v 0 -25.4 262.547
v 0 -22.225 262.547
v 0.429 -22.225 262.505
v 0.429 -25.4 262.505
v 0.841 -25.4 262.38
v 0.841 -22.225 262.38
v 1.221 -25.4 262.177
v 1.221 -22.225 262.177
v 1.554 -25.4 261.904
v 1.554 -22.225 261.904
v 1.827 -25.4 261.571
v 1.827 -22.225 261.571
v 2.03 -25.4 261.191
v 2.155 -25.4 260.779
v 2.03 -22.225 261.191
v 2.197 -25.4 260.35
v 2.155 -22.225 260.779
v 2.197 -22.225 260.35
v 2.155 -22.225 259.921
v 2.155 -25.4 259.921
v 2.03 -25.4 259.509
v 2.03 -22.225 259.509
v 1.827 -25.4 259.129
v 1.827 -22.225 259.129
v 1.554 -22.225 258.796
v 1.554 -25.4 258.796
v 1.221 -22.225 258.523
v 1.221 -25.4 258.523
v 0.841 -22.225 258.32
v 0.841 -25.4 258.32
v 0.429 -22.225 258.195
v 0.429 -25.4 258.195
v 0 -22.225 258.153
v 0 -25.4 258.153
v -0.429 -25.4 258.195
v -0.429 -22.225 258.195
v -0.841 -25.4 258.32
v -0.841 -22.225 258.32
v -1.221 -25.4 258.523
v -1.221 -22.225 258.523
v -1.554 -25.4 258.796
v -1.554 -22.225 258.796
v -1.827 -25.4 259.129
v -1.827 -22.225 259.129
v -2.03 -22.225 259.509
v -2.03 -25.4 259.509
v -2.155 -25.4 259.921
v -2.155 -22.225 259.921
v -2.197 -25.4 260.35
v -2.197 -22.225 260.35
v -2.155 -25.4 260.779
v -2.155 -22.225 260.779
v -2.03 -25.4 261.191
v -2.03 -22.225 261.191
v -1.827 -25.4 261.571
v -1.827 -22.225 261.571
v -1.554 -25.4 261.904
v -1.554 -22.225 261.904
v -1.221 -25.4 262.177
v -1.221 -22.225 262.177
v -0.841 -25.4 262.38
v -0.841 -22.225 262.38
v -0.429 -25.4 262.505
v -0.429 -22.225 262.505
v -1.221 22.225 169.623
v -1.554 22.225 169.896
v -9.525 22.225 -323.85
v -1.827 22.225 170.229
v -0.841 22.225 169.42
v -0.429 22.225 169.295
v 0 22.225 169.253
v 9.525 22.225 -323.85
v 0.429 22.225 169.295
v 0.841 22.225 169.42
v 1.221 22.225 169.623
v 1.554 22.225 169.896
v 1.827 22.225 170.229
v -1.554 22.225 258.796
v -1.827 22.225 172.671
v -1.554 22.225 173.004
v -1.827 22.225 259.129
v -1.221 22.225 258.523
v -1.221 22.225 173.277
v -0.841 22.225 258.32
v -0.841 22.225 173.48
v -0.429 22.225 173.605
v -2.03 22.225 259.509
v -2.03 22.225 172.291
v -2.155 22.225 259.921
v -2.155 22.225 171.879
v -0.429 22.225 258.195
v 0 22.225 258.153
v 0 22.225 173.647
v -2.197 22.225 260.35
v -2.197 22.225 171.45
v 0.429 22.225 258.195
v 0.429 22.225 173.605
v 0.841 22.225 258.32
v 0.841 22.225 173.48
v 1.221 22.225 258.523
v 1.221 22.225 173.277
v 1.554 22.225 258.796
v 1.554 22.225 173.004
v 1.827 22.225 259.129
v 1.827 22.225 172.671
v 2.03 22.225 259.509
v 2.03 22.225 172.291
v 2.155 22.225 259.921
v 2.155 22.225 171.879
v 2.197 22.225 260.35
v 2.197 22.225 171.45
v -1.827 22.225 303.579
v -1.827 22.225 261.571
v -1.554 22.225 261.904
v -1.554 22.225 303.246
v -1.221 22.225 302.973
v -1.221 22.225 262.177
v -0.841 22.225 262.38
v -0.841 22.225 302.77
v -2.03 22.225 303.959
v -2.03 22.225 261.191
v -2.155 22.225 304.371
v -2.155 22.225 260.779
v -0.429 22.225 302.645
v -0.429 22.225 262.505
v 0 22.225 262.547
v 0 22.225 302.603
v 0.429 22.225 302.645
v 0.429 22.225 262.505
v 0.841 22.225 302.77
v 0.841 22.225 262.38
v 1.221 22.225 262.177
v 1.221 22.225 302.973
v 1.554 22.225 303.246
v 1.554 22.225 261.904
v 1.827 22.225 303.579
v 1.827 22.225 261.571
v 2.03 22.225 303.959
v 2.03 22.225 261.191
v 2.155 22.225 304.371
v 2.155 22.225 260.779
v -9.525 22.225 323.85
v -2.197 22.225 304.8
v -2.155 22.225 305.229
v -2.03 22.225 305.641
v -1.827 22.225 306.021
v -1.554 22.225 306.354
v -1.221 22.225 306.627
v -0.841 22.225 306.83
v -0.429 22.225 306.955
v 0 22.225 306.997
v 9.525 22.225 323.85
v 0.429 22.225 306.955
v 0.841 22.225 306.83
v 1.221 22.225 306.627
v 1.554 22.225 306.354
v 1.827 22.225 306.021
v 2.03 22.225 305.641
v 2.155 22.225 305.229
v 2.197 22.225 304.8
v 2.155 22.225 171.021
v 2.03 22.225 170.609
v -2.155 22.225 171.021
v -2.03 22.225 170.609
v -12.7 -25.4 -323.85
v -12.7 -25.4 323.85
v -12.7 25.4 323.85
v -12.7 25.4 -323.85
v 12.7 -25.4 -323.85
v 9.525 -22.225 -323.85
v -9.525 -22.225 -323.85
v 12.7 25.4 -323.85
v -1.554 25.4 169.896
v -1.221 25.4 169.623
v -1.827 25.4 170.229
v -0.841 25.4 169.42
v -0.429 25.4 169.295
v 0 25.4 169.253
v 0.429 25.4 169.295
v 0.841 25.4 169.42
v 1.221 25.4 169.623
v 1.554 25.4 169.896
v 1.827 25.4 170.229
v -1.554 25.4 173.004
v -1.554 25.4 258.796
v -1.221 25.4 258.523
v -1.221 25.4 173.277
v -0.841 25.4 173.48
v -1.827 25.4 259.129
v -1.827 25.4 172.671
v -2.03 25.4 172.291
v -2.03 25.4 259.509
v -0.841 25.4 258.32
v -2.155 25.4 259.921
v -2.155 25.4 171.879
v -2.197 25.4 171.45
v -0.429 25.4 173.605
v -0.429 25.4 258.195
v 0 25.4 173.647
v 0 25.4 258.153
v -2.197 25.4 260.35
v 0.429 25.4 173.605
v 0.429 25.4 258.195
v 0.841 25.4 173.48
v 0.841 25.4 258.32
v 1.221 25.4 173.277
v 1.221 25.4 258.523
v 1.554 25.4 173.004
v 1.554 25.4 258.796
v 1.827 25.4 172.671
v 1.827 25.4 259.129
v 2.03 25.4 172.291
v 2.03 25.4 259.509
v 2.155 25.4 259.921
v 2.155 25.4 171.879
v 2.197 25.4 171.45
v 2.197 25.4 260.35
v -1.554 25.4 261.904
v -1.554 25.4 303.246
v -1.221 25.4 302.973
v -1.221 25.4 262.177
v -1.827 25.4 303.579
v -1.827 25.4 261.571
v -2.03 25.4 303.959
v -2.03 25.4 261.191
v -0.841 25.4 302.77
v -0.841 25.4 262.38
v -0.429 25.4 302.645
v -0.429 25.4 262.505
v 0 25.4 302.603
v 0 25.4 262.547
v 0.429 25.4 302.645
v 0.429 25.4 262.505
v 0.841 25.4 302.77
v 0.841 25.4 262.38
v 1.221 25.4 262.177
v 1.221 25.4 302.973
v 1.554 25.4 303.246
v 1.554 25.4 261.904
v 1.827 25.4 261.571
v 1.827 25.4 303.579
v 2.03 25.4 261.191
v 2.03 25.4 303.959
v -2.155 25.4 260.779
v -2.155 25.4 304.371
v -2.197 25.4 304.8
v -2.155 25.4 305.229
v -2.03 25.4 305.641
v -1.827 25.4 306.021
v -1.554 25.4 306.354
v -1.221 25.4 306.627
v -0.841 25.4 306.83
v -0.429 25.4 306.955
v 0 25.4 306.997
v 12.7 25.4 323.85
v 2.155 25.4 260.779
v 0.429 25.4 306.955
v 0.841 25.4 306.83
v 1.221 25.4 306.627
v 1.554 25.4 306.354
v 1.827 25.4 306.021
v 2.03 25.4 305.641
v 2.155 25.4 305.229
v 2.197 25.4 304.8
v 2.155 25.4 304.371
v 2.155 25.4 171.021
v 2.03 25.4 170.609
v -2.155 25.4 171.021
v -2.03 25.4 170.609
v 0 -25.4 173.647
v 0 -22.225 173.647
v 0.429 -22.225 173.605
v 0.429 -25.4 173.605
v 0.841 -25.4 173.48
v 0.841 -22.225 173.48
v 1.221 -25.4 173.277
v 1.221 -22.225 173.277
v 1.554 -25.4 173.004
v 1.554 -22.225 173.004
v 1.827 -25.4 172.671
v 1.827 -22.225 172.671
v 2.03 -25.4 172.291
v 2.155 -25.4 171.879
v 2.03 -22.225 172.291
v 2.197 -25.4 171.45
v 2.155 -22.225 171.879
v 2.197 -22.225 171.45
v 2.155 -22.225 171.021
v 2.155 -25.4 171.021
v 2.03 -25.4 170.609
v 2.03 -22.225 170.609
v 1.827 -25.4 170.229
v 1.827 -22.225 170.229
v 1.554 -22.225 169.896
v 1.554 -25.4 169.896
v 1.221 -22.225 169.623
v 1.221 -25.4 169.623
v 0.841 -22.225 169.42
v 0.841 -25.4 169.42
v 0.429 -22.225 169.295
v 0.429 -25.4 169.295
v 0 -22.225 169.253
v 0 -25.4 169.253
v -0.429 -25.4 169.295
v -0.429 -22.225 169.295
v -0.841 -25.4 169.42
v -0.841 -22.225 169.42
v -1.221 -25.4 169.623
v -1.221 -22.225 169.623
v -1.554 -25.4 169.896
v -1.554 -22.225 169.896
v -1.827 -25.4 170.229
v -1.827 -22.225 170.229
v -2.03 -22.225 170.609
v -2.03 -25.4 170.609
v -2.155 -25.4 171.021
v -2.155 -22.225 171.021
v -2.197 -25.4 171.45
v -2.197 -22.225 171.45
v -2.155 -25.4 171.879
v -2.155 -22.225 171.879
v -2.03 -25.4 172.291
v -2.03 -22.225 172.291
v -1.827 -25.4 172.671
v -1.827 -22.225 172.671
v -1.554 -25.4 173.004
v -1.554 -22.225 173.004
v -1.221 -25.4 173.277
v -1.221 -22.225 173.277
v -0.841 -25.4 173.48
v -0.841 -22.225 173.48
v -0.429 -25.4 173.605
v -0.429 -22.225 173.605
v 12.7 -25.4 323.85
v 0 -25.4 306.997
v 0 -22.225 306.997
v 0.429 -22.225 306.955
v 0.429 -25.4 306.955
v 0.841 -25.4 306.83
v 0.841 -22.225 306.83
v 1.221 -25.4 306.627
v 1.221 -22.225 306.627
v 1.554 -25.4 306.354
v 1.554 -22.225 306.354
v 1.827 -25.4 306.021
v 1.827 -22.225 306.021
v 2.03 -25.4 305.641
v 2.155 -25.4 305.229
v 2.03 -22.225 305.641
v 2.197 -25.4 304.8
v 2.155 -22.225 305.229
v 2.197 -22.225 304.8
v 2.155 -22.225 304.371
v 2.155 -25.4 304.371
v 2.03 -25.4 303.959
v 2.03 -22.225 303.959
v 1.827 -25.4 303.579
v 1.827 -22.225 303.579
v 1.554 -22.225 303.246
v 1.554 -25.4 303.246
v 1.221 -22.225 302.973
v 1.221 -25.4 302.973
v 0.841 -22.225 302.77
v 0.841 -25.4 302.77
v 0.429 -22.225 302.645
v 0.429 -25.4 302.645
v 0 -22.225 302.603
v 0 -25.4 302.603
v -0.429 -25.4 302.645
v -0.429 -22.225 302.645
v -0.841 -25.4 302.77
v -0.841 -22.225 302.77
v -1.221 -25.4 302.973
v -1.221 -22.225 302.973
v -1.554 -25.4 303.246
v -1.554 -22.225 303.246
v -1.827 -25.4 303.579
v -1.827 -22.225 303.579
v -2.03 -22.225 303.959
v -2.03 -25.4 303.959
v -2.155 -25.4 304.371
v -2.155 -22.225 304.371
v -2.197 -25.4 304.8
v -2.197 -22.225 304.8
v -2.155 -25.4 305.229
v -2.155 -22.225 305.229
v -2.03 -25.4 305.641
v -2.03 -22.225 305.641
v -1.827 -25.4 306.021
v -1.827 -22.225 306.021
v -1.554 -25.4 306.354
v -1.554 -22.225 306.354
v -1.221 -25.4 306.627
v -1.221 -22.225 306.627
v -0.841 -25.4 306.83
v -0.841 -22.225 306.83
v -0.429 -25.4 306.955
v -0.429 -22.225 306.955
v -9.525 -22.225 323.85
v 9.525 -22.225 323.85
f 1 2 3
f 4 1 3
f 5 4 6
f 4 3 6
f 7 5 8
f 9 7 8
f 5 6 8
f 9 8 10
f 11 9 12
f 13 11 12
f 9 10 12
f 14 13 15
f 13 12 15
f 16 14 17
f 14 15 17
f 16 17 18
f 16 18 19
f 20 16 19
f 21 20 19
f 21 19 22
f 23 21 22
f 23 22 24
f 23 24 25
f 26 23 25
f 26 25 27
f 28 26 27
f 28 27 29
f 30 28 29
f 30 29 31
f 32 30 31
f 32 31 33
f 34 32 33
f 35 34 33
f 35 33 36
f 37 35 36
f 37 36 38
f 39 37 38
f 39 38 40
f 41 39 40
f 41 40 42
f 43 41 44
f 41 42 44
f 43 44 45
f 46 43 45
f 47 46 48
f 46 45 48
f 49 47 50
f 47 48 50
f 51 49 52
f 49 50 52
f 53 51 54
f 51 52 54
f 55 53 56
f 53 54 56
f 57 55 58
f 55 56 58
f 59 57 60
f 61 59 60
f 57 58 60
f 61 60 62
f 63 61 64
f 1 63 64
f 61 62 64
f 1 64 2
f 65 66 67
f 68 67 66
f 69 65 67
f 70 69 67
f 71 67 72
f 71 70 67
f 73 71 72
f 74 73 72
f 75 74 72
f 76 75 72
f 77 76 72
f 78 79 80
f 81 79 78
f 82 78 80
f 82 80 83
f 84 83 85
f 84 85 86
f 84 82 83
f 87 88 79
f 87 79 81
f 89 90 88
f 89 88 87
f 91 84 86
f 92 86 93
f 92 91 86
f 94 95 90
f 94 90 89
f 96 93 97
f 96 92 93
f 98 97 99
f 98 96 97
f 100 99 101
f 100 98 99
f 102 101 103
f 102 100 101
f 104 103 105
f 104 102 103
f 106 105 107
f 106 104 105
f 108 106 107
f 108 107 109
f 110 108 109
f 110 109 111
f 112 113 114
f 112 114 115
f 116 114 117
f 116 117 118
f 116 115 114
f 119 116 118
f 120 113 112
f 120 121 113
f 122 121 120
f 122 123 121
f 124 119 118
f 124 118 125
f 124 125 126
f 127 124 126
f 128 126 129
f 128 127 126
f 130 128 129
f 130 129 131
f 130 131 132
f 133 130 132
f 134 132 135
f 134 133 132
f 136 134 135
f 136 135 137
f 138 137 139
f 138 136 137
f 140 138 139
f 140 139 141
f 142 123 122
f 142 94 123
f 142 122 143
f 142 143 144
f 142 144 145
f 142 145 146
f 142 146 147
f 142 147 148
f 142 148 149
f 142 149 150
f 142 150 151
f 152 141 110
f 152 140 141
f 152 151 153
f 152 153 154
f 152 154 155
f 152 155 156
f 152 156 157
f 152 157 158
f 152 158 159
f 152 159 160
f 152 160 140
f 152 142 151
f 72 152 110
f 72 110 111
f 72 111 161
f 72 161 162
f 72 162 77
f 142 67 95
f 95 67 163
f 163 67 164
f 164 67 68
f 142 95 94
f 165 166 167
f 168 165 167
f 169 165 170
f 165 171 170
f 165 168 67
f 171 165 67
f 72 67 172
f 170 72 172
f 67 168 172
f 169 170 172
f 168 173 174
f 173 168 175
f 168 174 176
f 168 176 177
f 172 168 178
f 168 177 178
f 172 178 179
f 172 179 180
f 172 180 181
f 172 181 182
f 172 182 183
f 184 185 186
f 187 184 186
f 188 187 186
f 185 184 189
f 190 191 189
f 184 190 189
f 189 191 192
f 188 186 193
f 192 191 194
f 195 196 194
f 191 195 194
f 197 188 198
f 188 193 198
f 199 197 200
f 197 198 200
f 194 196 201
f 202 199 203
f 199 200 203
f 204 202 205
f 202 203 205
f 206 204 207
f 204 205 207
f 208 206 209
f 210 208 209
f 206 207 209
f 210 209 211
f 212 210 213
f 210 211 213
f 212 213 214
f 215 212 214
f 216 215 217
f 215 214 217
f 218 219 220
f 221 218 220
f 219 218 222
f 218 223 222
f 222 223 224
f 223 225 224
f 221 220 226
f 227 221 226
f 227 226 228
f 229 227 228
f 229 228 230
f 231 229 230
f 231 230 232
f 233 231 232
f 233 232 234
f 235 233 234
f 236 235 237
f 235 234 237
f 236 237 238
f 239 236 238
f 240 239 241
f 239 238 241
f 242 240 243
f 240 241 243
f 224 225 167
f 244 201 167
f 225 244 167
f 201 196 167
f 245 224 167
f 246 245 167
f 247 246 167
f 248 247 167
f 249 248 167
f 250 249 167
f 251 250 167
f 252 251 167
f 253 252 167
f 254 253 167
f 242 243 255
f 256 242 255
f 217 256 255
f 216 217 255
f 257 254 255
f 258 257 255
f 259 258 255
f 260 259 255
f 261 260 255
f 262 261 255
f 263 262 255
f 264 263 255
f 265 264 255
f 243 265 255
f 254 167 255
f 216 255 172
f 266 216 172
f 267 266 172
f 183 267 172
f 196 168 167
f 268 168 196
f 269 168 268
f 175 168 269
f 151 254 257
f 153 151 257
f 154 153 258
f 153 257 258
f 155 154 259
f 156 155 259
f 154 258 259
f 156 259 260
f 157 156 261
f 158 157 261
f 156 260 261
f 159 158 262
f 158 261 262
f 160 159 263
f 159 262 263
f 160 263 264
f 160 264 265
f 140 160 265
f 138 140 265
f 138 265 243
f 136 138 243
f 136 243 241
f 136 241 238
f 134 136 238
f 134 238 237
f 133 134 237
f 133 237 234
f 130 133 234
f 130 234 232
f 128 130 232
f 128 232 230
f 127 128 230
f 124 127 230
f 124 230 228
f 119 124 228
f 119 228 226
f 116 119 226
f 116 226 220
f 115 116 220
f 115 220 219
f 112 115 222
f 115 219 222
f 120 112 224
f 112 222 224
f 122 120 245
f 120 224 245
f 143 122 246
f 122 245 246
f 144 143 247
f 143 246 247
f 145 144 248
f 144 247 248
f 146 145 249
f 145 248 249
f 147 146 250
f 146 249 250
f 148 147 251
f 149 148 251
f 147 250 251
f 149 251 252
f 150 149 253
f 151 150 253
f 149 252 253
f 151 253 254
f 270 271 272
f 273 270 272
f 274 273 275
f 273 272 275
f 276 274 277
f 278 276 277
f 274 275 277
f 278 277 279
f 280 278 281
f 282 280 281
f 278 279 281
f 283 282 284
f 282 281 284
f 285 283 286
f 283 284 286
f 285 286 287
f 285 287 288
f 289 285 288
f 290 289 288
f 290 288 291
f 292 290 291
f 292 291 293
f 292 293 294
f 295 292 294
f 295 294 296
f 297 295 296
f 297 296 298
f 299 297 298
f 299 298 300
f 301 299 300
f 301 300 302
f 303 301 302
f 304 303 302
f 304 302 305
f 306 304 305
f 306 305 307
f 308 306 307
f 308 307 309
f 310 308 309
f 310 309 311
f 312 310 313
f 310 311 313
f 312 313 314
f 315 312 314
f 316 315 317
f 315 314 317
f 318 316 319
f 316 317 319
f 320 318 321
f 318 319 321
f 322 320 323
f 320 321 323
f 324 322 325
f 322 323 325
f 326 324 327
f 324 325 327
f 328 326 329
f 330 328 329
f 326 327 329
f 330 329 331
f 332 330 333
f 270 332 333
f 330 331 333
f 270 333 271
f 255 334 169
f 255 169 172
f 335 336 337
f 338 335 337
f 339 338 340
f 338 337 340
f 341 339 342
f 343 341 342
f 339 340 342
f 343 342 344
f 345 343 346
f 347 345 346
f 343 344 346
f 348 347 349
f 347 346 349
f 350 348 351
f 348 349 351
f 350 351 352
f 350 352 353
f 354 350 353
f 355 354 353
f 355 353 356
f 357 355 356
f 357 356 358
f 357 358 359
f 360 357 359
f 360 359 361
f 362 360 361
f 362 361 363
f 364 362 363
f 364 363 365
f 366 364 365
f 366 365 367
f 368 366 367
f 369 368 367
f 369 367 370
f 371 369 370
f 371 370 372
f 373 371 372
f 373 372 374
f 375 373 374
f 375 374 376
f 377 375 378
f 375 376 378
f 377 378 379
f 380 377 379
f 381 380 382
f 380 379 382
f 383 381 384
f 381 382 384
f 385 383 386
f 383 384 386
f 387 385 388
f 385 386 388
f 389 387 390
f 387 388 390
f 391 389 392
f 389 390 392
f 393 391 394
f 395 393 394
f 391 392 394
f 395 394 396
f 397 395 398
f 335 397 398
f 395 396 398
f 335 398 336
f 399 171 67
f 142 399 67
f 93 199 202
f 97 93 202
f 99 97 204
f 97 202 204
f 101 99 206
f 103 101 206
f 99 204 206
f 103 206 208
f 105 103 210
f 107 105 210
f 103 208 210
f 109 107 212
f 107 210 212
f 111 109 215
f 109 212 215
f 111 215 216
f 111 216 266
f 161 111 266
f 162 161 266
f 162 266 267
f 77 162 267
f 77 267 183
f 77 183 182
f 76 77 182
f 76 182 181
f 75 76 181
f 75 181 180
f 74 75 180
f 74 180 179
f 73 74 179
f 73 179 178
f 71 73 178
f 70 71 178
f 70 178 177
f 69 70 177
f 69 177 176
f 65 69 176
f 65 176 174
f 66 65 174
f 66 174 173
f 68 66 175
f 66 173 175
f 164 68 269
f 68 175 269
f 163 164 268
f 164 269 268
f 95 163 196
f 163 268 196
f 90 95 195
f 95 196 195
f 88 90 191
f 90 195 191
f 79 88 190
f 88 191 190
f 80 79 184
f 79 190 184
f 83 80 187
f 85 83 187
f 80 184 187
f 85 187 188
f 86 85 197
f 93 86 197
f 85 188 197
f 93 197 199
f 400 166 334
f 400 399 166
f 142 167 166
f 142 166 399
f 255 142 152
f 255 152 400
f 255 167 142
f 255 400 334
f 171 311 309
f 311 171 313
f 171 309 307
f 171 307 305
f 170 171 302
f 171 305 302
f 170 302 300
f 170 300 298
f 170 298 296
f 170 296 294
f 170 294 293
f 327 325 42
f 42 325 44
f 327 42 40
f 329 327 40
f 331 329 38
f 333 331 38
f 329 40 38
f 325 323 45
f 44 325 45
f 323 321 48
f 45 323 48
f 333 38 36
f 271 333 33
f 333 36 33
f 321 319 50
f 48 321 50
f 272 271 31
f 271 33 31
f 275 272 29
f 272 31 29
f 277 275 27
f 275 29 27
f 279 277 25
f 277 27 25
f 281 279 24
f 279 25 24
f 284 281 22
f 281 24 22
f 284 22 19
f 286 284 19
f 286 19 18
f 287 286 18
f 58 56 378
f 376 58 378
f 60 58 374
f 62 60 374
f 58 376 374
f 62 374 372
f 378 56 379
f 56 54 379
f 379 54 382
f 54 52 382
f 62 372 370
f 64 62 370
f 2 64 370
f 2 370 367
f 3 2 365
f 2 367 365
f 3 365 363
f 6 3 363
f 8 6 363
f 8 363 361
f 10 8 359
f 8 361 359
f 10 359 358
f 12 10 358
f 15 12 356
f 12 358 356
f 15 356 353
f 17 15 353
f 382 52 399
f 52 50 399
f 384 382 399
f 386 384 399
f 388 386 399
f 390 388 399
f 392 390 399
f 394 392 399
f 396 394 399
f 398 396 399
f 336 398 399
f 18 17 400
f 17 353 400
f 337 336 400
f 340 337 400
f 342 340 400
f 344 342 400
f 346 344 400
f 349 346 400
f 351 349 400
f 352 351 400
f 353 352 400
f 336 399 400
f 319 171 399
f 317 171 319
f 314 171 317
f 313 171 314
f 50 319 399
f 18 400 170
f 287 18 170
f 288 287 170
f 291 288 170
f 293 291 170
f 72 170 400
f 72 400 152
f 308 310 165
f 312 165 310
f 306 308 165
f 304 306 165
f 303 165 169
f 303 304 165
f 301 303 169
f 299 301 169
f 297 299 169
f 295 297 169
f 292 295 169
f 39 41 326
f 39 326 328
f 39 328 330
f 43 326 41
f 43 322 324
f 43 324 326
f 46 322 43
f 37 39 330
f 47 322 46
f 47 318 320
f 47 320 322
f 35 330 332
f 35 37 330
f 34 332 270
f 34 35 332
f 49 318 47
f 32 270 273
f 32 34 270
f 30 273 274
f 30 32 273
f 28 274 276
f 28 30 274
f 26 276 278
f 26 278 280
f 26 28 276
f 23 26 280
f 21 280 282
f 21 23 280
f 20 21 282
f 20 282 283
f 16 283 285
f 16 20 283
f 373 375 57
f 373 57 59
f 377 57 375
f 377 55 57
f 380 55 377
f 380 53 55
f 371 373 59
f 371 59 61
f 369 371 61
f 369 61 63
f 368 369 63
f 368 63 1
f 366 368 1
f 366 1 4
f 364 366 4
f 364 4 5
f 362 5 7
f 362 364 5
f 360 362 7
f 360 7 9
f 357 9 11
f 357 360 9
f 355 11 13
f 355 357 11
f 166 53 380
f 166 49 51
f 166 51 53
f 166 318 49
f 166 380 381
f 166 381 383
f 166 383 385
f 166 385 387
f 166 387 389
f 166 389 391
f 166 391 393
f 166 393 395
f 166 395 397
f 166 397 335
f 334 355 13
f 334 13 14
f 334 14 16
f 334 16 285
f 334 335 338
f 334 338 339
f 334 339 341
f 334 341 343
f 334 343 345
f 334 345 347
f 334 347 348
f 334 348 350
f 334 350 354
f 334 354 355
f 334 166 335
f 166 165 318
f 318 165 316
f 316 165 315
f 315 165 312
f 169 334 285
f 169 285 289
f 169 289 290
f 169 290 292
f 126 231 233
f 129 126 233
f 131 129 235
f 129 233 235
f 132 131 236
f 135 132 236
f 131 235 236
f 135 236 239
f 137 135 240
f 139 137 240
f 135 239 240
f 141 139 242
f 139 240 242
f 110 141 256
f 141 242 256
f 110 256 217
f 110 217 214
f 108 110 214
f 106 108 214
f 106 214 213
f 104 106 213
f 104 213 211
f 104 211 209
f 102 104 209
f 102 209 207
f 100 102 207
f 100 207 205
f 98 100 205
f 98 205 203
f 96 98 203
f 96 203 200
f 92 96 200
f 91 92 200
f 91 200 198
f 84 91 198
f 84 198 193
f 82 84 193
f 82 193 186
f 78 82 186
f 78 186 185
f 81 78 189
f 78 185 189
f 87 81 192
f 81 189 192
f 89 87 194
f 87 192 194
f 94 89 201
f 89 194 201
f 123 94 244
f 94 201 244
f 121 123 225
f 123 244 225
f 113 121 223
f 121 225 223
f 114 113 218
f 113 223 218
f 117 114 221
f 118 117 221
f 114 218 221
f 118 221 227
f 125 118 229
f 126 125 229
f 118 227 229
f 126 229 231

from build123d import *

# Parameters (mm, degrees)
SKETCH1_W           = 25.4
SKETCH1_H           = 50.8
SKETCH1_W_2         = 19.05
SKETCH1_H_2         = 44.45
BOSS_EXTRUDE1_DEPTH = 323.85
CUT_EXTRUDE1_REACH  = 330.056
SKETCH2_R           = 2.1971


with BuildPart() as part:
    # Sketch1 → Boss-Extrude1 (new, symmetric)
    with BuildSketch(Plane.XY):
        Rectangle(SKETCH1_W, SKETCH1_H)
        Rectangle(SKETCH1_W_2, SKETCH1_H_2, mode=Mode.SUBTRACT)
    extrude(amount=BOSS_EXTRUDE1_DEPTH, both=True)

    # Cut-Extrude1: up to this face of the body (flat: up to its plane)
    cut_extrude1_end = Plane(part.part.faces().sort_by_distance((0, -25.4, 0))[0])
    # Sketch2 → Cut-Extrude1 (cut, up to the picked face)
    with BuildSketch(Plane(origin=(0, 25.4, 0), x_dir=(1, 0, 0), z_dir=(0, 1, 0)), mode=Mode.PRIVATE) as cut_extrude1_sk1:
        with Locations(Location((8.2464e-05, -304.8, 0), (0, 0, 270))):
            Circle(SKETCH2_R)
    cut_extrude1_tool1 = split(extrude(cut_extrude1_sk1.sketch, amount=-CUT_EXTRUDE1_REACH, mode=Mode.PRIVATE), bisect_by=cut_extrude1_end, keep=Keep.BOTH, mode=Mode.PRIVATE)
    # Sketch2 → Cut-Extrude1 (cut, up to the picked face)
    with BuildSketch(Plane(origin=(0, 25.4, 0), x_dir=(1, 0, 0), z_dir=(0, 1, 0)), mode=Mode.PRIVATE) as cut_extrude1_sk2:
        with Locations(Location((8.2464e-05, -260.35, 0), (0, 0, 270))):
            Circle(SKETCH2_R)
    cut_extrude1_tool2 = split(extrude(cut_extrude1_sk2.sketch, amount=-CUT_EXTRUDE1_REACH, mode=Mode.PRIVATE), bisect_by=cut_extrude1_end, keep=Keep.BOTH, mode=Mode.PRIVATE)
    # Sketch2 → Cut-Extrude1 (cut, up to the picked face)
    with BuildSketch(Plane(origin=(0, 25.4, 0), x_dir=(1, 0, 0), z_dir=(0, 1, 0)), mode=Mode.PRIVATE) as cut_extrude1_sk3:
        with Locations(Location((8.2464e-05, -171.45, 0), (0, 0, 270))):
            Circle(SKETCH2_R)
    cut_extrude1_tool3 = split(extrude(cut_extrude1_sk3.sketch, amount=-CUT_EXTRUDE1_REACH, mode=Mode.PRIVATE), bisect_by=cut_extrude1_end, keep=Keep.BOTH, mode=Mode.PRIVATE)
    add(cut_extrude1_tool1.solids().sort_by(Axis((8.2e-05, 25.4, 304.8), (0, -1, 0)))[0], mode=Mode.SUBTRACT)
    add(cut_extrude1_tool2.solids().sort_by(Axis((8.2e-05, 25.4, 260.35), (0, -1, 0)))[0], mode=Mode.SUBTRACT)
    add(cut_extrude1_tool3.solids().sort_by(Axis((8.2e-05, 25.4, 171.45), (0, -1, 0)))[0], mode=Mode.SUBTRACT)


solid = part.part
